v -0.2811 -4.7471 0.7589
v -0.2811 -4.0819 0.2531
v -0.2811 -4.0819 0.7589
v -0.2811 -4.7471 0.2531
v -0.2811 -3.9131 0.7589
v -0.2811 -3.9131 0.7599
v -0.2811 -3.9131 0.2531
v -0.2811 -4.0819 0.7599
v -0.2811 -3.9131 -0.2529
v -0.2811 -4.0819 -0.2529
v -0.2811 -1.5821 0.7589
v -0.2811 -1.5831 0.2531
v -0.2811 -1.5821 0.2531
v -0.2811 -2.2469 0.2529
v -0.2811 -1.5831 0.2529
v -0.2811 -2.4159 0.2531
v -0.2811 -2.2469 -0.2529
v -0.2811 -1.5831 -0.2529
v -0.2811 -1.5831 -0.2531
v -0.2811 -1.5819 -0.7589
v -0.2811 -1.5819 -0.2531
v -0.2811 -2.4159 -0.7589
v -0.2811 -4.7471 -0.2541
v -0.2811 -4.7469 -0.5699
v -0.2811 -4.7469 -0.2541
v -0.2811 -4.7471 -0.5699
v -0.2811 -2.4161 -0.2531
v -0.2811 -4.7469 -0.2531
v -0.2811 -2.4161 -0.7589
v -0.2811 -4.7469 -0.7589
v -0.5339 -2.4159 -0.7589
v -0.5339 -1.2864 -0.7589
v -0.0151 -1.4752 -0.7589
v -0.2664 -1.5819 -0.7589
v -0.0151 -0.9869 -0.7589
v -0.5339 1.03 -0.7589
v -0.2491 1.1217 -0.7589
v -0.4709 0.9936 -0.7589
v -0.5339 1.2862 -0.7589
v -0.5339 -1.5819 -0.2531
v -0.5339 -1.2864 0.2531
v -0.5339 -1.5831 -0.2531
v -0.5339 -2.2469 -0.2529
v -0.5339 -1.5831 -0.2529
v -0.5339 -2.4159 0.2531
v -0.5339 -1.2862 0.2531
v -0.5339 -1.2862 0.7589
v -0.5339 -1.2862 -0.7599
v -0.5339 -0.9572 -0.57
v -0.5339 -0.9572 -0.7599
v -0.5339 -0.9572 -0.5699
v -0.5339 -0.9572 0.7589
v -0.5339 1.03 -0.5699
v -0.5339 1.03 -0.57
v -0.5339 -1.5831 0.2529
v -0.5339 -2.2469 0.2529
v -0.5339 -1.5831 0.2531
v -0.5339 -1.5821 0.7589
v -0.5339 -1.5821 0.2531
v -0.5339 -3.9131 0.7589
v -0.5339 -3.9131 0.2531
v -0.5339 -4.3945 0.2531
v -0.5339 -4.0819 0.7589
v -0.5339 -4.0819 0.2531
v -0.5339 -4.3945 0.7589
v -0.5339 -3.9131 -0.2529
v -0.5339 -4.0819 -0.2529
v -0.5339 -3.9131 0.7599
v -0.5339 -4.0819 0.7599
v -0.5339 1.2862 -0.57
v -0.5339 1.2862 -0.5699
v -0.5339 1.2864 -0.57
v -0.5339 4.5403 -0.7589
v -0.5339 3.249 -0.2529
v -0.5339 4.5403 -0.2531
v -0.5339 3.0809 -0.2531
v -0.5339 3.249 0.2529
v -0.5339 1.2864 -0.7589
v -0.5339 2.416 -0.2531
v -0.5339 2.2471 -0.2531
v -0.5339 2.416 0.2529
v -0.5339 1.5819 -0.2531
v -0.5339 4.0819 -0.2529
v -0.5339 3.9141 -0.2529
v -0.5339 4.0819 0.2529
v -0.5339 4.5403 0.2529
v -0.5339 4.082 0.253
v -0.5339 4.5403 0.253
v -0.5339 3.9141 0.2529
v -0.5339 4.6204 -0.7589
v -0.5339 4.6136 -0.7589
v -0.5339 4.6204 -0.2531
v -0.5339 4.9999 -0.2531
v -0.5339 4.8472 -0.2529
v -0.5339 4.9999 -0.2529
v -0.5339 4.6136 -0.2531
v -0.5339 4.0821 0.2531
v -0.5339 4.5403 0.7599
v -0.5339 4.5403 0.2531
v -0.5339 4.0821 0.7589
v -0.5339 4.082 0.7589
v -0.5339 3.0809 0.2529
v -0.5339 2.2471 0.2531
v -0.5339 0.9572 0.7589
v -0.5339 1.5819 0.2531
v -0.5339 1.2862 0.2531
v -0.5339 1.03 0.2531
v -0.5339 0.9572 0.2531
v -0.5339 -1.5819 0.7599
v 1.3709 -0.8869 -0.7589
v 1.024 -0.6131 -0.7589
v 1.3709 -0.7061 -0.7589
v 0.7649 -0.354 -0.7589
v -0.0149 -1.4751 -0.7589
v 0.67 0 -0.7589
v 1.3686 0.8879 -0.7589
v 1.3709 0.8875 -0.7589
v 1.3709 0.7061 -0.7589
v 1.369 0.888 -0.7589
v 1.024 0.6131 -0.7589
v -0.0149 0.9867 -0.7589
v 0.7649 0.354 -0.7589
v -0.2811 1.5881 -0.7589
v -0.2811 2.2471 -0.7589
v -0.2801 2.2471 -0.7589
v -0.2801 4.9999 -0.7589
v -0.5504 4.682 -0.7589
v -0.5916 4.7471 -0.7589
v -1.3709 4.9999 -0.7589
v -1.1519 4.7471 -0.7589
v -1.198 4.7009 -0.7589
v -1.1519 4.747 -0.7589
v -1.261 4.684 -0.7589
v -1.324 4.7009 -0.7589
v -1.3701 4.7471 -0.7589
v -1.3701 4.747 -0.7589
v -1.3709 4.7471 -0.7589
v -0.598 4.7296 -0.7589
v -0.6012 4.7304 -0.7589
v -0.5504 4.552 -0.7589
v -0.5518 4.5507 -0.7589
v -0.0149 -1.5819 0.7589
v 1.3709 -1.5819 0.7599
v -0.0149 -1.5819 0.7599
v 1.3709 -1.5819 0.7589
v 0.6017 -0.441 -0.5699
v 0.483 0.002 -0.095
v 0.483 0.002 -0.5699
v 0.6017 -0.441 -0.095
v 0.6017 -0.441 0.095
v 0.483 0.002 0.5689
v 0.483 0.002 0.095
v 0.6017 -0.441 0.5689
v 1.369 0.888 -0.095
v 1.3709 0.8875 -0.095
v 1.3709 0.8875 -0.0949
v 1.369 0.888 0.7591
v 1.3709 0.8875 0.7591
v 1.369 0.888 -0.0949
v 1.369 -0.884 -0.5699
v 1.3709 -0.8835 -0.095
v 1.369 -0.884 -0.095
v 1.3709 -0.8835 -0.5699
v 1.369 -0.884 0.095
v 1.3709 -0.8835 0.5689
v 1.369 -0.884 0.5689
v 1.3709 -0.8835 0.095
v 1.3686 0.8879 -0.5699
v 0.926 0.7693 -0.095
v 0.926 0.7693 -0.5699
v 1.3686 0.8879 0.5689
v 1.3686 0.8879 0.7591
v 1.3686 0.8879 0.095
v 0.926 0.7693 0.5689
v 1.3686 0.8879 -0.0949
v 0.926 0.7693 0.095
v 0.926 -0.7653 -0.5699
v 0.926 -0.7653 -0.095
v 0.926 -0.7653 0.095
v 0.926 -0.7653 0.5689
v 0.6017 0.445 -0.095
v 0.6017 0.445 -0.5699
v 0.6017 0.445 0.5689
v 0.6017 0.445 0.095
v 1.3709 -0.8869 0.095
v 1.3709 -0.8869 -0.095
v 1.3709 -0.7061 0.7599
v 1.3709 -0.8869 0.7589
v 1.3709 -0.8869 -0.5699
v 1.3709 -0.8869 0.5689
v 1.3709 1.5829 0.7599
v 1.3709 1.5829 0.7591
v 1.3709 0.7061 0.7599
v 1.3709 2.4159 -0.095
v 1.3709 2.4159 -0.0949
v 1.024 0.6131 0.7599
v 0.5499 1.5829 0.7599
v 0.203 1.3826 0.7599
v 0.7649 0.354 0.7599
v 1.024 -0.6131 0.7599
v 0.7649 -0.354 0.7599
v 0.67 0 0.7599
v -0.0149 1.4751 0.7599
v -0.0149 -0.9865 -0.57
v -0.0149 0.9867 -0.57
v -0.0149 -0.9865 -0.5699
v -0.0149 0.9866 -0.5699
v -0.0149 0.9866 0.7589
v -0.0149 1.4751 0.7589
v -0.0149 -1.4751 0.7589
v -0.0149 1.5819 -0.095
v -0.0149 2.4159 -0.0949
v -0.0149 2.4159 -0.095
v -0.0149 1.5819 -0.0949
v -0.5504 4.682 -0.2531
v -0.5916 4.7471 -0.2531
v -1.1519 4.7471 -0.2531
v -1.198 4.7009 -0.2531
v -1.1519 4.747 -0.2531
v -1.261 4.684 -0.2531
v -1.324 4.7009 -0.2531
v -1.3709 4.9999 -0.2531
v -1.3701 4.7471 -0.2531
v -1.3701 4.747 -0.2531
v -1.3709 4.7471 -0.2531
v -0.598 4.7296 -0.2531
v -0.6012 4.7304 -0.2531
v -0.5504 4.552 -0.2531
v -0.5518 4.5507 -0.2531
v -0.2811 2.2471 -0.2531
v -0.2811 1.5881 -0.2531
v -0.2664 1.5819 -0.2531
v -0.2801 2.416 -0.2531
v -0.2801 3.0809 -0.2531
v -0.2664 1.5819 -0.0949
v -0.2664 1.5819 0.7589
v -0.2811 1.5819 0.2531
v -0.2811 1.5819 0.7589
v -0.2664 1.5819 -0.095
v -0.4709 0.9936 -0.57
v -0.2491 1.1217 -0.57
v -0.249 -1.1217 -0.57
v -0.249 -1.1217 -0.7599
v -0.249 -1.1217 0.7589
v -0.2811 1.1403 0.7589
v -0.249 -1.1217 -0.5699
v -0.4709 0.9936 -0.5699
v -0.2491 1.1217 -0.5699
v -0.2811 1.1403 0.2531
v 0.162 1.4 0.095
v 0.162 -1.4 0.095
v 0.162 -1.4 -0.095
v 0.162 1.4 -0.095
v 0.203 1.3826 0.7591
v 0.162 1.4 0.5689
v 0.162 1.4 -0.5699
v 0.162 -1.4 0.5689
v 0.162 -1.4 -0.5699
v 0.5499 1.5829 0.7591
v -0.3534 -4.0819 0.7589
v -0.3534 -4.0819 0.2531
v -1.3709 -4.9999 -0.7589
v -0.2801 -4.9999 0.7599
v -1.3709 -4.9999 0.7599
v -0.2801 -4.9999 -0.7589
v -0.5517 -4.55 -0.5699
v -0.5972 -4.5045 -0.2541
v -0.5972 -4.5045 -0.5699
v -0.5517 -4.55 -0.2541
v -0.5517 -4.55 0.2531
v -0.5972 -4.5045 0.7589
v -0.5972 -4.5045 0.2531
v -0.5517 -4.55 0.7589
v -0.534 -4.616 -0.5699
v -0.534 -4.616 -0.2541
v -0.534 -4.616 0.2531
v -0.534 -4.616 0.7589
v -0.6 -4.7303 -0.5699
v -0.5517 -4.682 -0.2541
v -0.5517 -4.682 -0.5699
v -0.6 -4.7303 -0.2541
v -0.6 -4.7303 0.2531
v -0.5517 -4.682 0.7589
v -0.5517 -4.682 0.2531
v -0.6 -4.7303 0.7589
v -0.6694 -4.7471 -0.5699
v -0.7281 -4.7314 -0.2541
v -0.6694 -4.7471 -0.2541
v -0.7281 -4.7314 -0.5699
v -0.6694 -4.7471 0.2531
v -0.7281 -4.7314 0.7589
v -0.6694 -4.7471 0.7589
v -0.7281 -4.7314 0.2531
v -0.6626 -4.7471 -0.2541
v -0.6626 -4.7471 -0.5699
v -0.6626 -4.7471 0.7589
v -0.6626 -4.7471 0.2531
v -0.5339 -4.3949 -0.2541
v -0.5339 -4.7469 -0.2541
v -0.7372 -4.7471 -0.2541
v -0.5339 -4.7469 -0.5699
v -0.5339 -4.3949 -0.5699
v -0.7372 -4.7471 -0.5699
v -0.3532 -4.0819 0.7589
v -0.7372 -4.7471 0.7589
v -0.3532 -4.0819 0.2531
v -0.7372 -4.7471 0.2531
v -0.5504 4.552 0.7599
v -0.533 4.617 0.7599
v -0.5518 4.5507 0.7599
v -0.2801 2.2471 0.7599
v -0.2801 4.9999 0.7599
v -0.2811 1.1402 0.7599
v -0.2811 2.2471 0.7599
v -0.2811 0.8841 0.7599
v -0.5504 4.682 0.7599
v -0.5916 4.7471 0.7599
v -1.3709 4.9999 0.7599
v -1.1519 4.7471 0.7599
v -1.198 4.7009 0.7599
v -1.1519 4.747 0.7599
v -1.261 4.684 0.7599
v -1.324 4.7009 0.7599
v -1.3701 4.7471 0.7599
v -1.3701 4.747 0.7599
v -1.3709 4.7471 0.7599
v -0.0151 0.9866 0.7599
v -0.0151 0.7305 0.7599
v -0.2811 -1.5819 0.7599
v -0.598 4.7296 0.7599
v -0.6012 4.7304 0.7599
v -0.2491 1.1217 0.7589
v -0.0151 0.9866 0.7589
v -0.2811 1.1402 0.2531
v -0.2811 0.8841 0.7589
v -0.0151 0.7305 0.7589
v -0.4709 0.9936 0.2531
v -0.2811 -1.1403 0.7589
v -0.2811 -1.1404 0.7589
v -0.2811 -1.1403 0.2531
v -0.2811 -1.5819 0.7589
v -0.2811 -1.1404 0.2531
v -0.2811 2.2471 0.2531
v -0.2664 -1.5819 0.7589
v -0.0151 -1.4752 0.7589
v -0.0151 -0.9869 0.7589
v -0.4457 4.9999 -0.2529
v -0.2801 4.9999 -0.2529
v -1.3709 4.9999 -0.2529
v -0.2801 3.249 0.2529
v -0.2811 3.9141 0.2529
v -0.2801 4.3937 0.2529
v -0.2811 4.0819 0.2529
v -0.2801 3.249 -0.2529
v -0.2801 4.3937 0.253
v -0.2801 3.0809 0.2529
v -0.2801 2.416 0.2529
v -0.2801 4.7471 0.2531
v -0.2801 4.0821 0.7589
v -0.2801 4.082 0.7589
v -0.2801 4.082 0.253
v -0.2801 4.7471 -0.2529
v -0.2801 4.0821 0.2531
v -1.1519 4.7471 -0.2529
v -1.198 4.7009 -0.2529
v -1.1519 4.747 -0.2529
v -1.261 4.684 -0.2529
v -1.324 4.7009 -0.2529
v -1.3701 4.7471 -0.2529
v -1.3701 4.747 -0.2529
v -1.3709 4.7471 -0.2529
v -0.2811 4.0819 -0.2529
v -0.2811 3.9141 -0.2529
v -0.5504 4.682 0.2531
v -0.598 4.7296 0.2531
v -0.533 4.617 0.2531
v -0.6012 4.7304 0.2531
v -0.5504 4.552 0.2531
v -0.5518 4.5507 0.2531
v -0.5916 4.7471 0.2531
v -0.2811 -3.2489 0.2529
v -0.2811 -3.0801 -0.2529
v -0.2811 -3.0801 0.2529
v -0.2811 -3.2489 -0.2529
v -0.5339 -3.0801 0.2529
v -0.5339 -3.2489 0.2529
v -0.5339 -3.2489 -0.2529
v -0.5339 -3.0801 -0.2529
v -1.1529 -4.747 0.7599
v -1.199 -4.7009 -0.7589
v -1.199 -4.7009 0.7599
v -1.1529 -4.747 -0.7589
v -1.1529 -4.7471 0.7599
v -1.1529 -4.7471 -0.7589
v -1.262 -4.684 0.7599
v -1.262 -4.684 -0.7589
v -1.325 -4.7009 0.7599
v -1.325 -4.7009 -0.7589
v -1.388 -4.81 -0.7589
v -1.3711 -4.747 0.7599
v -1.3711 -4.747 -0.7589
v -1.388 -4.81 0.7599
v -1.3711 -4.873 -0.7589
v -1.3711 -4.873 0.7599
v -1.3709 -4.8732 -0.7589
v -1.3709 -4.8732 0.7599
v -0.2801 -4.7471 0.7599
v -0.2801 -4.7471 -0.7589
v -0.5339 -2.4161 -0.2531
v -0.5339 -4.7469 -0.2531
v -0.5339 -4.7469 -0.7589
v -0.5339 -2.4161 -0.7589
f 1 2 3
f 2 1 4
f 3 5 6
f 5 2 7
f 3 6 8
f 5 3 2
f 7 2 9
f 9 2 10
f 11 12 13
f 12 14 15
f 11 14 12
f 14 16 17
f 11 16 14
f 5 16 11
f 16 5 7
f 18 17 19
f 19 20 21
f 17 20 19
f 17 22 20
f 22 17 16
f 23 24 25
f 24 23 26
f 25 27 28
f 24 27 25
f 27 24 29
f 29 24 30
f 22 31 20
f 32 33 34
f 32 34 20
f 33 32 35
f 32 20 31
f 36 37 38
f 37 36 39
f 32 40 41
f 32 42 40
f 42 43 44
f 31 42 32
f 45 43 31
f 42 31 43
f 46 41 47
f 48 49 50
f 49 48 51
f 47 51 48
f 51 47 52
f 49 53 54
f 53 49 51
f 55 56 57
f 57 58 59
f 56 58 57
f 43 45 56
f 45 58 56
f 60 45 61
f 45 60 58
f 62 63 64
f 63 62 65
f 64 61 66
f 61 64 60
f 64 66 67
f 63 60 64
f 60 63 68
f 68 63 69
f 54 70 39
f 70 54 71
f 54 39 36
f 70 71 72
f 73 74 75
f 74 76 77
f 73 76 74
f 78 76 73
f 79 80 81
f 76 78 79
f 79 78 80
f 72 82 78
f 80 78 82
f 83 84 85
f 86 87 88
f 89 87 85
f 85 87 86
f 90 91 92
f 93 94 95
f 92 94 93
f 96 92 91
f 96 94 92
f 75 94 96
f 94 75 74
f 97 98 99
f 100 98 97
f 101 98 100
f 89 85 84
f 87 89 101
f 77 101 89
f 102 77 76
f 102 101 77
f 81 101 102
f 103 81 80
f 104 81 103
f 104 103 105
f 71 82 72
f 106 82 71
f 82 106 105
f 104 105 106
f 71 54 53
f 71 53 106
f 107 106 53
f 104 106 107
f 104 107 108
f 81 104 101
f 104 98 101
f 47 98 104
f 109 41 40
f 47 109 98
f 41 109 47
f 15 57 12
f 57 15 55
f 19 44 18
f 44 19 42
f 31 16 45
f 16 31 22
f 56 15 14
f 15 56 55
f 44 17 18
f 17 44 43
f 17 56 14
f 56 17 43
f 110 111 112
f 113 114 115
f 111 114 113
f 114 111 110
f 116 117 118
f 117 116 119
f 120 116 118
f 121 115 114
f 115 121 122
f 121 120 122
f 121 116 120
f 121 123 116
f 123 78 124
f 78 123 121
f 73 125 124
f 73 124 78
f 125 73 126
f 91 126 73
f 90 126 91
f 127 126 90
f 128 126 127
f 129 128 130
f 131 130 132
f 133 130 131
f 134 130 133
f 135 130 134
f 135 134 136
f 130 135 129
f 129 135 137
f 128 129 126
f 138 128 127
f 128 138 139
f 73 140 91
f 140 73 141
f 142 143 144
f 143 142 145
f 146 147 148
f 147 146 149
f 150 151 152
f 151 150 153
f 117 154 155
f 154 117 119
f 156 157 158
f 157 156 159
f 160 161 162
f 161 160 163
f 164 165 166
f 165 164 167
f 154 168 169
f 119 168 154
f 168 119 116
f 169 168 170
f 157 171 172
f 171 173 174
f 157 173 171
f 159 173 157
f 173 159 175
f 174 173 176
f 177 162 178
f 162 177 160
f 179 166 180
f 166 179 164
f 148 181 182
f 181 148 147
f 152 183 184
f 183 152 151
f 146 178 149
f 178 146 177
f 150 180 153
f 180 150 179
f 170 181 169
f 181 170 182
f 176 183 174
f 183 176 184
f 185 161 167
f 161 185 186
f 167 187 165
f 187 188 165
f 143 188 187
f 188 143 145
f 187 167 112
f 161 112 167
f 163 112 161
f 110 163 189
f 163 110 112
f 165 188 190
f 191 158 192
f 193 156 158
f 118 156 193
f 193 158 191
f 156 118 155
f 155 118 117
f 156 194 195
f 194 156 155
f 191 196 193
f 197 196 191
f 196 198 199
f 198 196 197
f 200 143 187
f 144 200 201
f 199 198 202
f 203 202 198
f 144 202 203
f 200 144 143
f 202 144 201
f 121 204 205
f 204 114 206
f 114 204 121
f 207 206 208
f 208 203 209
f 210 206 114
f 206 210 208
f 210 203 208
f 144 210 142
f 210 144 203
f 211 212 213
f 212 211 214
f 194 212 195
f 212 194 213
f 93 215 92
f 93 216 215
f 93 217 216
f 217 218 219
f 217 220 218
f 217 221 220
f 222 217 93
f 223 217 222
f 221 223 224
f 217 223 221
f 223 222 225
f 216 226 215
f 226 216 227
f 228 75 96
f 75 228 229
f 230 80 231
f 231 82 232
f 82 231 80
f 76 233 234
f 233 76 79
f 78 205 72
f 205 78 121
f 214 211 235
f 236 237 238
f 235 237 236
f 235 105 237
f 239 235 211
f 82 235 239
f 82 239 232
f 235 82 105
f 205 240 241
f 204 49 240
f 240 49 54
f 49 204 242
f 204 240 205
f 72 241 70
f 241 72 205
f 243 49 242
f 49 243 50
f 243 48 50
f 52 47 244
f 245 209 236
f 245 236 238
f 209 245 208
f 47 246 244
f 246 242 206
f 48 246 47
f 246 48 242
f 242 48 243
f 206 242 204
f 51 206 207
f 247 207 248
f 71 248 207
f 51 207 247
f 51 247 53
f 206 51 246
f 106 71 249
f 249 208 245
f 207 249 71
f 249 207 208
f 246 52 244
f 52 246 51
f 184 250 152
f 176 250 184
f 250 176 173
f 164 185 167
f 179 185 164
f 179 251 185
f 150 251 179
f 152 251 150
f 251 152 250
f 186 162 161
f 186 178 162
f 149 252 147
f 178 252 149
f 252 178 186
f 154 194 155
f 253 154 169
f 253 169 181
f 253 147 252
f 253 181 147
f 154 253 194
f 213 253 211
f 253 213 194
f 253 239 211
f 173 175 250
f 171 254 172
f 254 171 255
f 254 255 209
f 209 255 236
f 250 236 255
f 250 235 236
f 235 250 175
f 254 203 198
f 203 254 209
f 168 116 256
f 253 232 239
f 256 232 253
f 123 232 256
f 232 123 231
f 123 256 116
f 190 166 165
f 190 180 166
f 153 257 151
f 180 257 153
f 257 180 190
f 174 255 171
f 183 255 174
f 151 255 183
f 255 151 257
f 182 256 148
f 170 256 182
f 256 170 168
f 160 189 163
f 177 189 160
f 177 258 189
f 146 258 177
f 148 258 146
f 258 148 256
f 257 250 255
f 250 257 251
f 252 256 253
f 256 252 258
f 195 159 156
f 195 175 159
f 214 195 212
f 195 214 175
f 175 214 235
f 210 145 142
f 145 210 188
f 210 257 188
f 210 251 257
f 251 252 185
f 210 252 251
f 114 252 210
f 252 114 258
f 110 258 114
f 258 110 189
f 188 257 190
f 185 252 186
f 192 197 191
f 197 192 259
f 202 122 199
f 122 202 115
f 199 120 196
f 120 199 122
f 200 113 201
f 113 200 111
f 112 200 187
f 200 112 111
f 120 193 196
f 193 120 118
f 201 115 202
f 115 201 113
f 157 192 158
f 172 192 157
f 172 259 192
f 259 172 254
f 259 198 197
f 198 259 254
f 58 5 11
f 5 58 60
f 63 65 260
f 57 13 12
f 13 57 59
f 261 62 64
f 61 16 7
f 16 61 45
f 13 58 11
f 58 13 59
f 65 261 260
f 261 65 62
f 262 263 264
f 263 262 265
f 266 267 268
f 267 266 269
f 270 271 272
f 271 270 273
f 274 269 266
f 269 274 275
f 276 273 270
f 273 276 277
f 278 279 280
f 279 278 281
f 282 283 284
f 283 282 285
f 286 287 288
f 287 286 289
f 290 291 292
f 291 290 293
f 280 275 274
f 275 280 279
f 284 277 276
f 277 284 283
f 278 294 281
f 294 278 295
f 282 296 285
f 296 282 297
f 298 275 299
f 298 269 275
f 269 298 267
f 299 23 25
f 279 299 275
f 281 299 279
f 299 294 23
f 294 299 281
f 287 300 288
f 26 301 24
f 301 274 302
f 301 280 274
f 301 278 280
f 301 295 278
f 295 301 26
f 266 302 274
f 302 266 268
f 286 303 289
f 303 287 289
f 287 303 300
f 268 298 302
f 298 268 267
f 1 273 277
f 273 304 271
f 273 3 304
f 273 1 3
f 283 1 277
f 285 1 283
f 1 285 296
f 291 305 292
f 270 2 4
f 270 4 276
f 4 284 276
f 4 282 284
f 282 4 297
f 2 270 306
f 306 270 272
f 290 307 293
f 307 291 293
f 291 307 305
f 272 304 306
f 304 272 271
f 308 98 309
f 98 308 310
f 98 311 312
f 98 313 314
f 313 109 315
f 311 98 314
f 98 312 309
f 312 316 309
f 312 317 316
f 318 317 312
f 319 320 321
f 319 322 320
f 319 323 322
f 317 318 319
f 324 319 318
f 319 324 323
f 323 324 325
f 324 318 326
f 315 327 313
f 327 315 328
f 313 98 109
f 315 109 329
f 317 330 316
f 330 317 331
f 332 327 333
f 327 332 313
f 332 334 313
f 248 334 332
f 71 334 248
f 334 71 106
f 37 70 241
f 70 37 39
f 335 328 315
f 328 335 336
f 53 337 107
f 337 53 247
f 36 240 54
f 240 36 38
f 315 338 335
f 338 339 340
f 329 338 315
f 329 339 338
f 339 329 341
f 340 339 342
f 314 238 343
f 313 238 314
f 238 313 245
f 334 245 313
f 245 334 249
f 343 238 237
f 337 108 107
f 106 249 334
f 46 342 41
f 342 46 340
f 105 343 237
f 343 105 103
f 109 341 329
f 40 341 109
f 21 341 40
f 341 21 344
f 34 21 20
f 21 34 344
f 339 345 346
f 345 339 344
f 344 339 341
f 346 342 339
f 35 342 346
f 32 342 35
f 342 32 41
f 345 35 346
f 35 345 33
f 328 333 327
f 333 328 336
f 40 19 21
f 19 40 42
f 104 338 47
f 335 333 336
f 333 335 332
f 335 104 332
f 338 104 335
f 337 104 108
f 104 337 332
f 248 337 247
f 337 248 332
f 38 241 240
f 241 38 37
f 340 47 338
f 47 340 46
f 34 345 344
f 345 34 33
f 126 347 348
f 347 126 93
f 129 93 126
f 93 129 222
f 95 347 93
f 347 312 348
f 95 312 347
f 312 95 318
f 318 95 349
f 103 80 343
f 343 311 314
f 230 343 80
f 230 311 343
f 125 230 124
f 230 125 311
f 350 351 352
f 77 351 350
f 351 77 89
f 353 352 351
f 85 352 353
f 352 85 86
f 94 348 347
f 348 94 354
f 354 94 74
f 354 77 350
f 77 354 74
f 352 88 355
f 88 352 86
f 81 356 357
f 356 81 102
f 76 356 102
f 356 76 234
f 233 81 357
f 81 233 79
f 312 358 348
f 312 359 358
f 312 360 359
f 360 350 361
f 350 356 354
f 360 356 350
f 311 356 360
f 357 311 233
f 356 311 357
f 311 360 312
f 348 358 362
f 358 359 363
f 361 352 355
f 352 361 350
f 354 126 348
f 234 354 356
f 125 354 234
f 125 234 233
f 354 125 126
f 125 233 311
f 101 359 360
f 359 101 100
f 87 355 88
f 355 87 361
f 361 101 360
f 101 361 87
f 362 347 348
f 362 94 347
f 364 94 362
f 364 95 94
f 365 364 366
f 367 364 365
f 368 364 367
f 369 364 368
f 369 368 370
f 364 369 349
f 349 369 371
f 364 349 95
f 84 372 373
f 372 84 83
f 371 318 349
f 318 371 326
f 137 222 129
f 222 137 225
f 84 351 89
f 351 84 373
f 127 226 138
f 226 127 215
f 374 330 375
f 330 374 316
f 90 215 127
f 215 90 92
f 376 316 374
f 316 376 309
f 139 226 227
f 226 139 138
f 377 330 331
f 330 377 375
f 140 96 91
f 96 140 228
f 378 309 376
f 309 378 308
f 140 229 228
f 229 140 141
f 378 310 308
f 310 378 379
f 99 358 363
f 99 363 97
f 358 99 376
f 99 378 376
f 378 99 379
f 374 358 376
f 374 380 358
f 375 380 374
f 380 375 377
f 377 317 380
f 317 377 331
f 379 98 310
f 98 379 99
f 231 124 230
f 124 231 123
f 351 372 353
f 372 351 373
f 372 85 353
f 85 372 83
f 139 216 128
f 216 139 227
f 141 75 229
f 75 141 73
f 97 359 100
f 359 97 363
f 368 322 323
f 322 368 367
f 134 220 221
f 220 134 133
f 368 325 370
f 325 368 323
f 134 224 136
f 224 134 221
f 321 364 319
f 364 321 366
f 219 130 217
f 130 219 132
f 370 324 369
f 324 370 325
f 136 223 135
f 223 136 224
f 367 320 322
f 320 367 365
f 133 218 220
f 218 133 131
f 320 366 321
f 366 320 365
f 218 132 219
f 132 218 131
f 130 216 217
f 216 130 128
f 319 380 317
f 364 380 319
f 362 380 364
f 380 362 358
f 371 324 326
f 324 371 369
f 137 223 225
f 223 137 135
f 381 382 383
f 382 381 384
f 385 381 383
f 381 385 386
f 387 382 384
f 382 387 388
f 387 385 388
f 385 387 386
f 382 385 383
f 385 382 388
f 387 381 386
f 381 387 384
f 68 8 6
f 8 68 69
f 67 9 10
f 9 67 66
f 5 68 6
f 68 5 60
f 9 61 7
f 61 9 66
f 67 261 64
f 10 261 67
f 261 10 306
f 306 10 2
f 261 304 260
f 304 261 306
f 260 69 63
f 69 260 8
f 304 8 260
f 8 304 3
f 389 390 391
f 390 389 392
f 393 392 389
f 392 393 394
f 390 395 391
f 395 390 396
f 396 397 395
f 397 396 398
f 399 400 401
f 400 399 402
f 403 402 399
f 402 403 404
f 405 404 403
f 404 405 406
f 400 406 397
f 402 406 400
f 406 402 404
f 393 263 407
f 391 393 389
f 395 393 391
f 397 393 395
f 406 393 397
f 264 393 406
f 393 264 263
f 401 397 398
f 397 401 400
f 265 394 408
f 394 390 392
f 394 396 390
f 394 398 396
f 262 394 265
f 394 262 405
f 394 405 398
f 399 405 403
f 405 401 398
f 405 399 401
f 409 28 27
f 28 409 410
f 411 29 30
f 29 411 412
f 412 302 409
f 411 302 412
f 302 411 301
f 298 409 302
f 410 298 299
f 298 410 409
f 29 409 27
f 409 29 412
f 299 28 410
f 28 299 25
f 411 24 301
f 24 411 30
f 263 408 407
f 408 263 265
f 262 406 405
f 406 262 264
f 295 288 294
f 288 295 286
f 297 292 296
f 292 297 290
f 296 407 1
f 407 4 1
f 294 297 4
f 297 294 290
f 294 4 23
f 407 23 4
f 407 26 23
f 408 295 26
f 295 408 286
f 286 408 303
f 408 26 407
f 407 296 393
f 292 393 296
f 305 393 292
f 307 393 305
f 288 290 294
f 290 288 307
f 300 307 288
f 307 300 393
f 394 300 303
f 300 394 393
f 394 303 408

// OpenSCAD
intersection() {
  translate([-0.0005, 0, 0.0005])
  cube(size = [3.2908, 11.9998, 1.8228], center = true);

  union() {
    difference() {
      translate([-0.4075, -1.9995, -0.2525])
      cube(size = [0.2528, 0.8328, 1.0128], center = true);
    
      translate([-0.4075, -1.9145, 0])
      cube(size = [0.2529, 0.6649, 0.5059], center = true);
    }
  
    translate([-0.4075, -3.1645, 0])
    cube(size = [0.2528, 0.1688, 0.5058], center = true);
  
    translate([-0.4075, -3.9975, 0.2535])
    cube(size = [0.2528, 0.1688, 1.0128], center = true);
  
    difference() {
      union() {
        intersection() {
          difference() {
            translate([8.783, 8.259, 8.671])
            cube(size = [18.6338, 19.6818, 18.8598], center = true);
          
            translate([1.369, 0.002, 8.671])
            cylinder(h = 18.8599, r1 = 0.886, r2 = 0.886, center = true, $fn = 12);
          }
        
          union() {
            translate([0.678, 0.417, 0.0005])
            cube(size = [1.3858, 3.9978, 1.5188], center = true);
          
            translate([-2.3495, 12.2955, -0.506])
            rotate([0, 0, -30])
            cube(size = [19.8348, 17.2528, 0.5058], center = true);
          }
        }
      
        intersection() {
          difference() {
            translate([-0.186, -0.3325, -8.67])
            cube(size = [0.6958, 3.8288, 18.8598], center = true);
          
            translate([4.251, 7.36295, -9.335])
            rotate([0, 0, -30])
            cube(size = [36.1999, 19.1959, 17.5299], center = true);
          }
        
          difference() {
            translate([-4.31325, 7.47077, -0.0005])
            rotate([-180, 0, 30])
            cube(size = [36.1998, 18.9468, 1.5188], center = true);
          
            translate([-7.1485, 3.98343, 0.0945])
            rotate([0, 0, -30])
            cube(size = [19.8349, 1.9429, 1.3289], center = true);
          }
        }
      }
    
      union() {
        intersection() {
          difference() {
            translate([0, 0, 0.0005])
            rotate([0, 0, -30])
            cube(size = [36.1999, 36.1999, 1.5189], center = true);
          
            translate([-7.08625, 4.09125, 0])
            rotate([0, 0, -30])
            cube(size = [19.835, 36.2, 0.19], center = true);
          }
        
          union() {
            translate([3.80025, 8.95283, -8.67])
            rotate([0, 0, -23])
            cube(size = [36.1999, 16.7479, 18.8599], center = true);
          
            translate([9.131, -8.259, -0.0005])
            cube(size = [17.9379, 19.6819, 1.1389], center = true);
          }
        }
      
        translate([3.80025, 8.95283, 0.079])
        rotate([0, 0, -23])
        cube(size = [36.1999, 16.7479, 0.3479], center = true);
      
        translate([3.80025, -8.95283, -0.0005])
        rotate([-180, 0, 23])
        cube(size = [36.1999, 16.7479, 1.5189], center = true);
      }
    }
  
    translate([-1.262, -4.81, 0.0005])
    cylinder(h = 1.5188, r1 = 0.126, r2 = 0.126, center = true, $fn = 12);
  
    intersection() {
      difference() {
        translate([0.7665, 0.0005, 0.0005])
        cube(size = [1.2088, 3.1648, 1.5188], center = true);
      
        translate([1.378, 0, 8.671])
        cylinder(h = 18.8599, r1 = 0.708, r2 = 0.708, center = true, $fn = 12);
      }
    
      union() {
        translate([-0.06225, 0.10782, 9.4295])
        rotate([-180, 0, 30])
        cube(size = [36.1998, 1.9428, 17.3408], center = true);
      
        translate([1.369, 0.002, -8.67])
        cylinder(h = 18.8598, r1 = 0.886, r2 = 0.886, center = true, $fn = 12);
      }
    }
  
    intersection() {
      translate([-0.4075, -9.841, 0.506])
      cube(size = [0.2528, 16.5178, 0.5058], center = true);
    
      translate([-11.8853, -4.22086, 0.506])
      rotate([0, 0, -30])
      cube(size = [19.8348, 17.0038, 0.5058], center = true);
    }
  
    intersection() {
      difference() {
        translate([-9.1905, 6.55, 0])
        cube(size = [17.8188, 23.0998, 36.1998], center = true);
      
        translate([-0.666, -4.616, -8.67])
        cylinder(h = 18.8599, r1 = 0.132, r2 = 0.132, center = true, $fn = 12);
      }
    
      union() {
        translate([8.58881, -4.95875, -0.412])
        rotate([0, 0, -30])
        cube(size = [16.3648, 36.1998, 0.3158], center = true);
      
        translate([8.58881, -4.95875, 0.506])
        rotate([0, 0, -30])
        cube(size = [16.3648, 36.1998, 0.5058], center = true);
      }
    }
  
    translate([-0.4075, -3.5815, -0.506])
    cube(size = [0.2528, 2.3308, 0.5058], center = true);
  
    intersection() {
      union() {
        translate([-6.71825, 4.72864, 0.0005])
        rotate([0, 0, -30])
        cube(size = [19.8348, 0.2218, 1.5188], center = true);
      
        translate([-2.3495, 12.2955, -9.4295])
        rotate([0, 0, -30])
        cube(size = [19.8348, 17.2528, 17.3408], center = true);
      
        translate([-0.4075, 0.417, 9.1765])
        cube(size = [0.2528, 3.9978, 17.8468], center = true);
      
        translate([4.73675, -8.20429, -0.0005])
        rotate([-180, 0, 30])
        cube(size = [36.1998, 17.2528, 1.5188], center = true);
      }
    
      difference() {
        union() {
          translate([-0.2745, 8.259, 0.0005])
          cube(size = [0.5188, 19.6818, 1.5188], center = true);
        
          translate([-0.4075, 0.084, -0.506])
          cube(size = [0.2528, 4.6618, 0.5058], center = true);
        }
      
        union() {
          translate([-0.06225, 0.10782, -0.0005])
          rotate([-180, 0, 30])
          cube(size = [36.1999, 1.9429, 1.5189], center = true);
        
          translate([3.80025, -8.95283, -8.671])
          rotate([-180, 0, 23])
          cube(size = [36.1999, 16.7479, 18.8599], center = true);
        }
      }
    }
  
    translate([-0.8255, -4.8735, 0.0005])
    cube(size = [1.0908, 0.2528, 1.5188], center = true);
  
    difference() {
      intersection() {
        difference() {
          difference() {
            translate([8.783, 3.6235, 0])
            cube(size = [18.6338, 2.7528, 36.1998], center = true);
          
            translate([8.783, 3.998, 0])
            cube(size = [18.6339, 1.4979, 0.5059], center = true);
          }
        
          union() {
            translate([12.0291, 5.62102, 8.9235])
            rotate([0, 0, -30])
            cube(size = [20.9859, 14.4349, 18.3529], center = true);
          
            translate([8.783, 2.7485, -8.9235])
            cube(size = [18.6339, 0.6649, 18.3529], center = true);
          }
        }
      
        translate([-0.8255, 10.1735, 0.0005])
        cube(size = [1.0908, 15.8528, 1.5188], center = true);
      }
    
      intersection() {
        union() {
          difference() {
            translate([-0.4075, 3.5815, 0])
            cube(size = [0.2529, 0.6649, 36.1999], center = true);
          
            translate([2.97911, -10.054, 0])
            rotate([0, 0, -30])
            cube(size = [20.986, 21.765, 36.2], center = true);
          }
        
          translate([-0.8255, 4.4145, 0.506])
          cube(size = [1.0909, 0.6649, 0.5059], center = true);
        }
      
        union() {
          difference() {
            sphere(r = 54.2999, $fn = 108);
          
            translate([-12.696, -1.00404, 0.2535])
            rotate([0, 0, -30])
            cube(size = [15.214, 21.765, 1.013], center = true);
          }
        
          translate([-1.261, 4.81, -8.67])
          cylinder(h = 18.8599, r1 = 0.126, r2 = 0.126, center = true, $fn = 12);
        }
      }
    }
  
    intersection() {
      difference() {
        intersection() {
          translate([-0.8255, -6.55, 0.0005])
          cube(size = [1.0908, 23.0998, 1.5188], center = true);
        
          union() {
            translate([0, 0, -0.506])
            rotate([0, 0, -30])
            cube(size = [36.1998, 36.1998, 0.5058], center = true);
          
            translate([-0.8255, 4.4575, 0.2535])
            cube(size = [1.0908, 1.0868, 1.0128], center = true);
          }
        }
      
        union() {
          translate([-3.27198, -7.70831, -0.506])
          rotate([0, 0, -23])
          cube(size = [36.1999, 19.4519, 0.5059], center = true);
        
          translate([-0.663, 4.617, -8.67])
          cylinder(h = 18.8599, r1 = 0.13, r2 = 0.13, center = true, $fn = 12);
        }
      }
    
      union() {
        translate([12.0291, 5.62102, 9.1765])
        rotate([0, 0, -30])
        cube(size = [20.9858, 14.4348, 17.8468], center = true);
      
        translate([-0.4075, -7.009, -0.2525])
        cube(size = [0.2528, 22.1818, 1.0128], center = true);
      
        translate([12.0291, 5.62102, -0.506])
        rotate([0, 0, -30])
        cube(size = [20.9858, 14.4348, 0.5058], center = true);
      
        translate([8.783, 4.541, 9.1765])
        cube(size = [18.6338, 0.9178, 17.8468], center = true);
      
        translate([-1.261, 4.81, -8.67])
        cylinder(h = 18.8598, r1 = 0.126, r2 = 0.126, center = true, $fn = 12);
      
        translate([8.783, 10.1735, -9.1765])
        cube(size = [18.6338, 15.8528, 17.8468], center = true);
      
        translate([8.3645, 4.8735, 0])
        cube(size = [19.4708, 0.2528, 36.1998], center = true);
      }
    }
  }
}
